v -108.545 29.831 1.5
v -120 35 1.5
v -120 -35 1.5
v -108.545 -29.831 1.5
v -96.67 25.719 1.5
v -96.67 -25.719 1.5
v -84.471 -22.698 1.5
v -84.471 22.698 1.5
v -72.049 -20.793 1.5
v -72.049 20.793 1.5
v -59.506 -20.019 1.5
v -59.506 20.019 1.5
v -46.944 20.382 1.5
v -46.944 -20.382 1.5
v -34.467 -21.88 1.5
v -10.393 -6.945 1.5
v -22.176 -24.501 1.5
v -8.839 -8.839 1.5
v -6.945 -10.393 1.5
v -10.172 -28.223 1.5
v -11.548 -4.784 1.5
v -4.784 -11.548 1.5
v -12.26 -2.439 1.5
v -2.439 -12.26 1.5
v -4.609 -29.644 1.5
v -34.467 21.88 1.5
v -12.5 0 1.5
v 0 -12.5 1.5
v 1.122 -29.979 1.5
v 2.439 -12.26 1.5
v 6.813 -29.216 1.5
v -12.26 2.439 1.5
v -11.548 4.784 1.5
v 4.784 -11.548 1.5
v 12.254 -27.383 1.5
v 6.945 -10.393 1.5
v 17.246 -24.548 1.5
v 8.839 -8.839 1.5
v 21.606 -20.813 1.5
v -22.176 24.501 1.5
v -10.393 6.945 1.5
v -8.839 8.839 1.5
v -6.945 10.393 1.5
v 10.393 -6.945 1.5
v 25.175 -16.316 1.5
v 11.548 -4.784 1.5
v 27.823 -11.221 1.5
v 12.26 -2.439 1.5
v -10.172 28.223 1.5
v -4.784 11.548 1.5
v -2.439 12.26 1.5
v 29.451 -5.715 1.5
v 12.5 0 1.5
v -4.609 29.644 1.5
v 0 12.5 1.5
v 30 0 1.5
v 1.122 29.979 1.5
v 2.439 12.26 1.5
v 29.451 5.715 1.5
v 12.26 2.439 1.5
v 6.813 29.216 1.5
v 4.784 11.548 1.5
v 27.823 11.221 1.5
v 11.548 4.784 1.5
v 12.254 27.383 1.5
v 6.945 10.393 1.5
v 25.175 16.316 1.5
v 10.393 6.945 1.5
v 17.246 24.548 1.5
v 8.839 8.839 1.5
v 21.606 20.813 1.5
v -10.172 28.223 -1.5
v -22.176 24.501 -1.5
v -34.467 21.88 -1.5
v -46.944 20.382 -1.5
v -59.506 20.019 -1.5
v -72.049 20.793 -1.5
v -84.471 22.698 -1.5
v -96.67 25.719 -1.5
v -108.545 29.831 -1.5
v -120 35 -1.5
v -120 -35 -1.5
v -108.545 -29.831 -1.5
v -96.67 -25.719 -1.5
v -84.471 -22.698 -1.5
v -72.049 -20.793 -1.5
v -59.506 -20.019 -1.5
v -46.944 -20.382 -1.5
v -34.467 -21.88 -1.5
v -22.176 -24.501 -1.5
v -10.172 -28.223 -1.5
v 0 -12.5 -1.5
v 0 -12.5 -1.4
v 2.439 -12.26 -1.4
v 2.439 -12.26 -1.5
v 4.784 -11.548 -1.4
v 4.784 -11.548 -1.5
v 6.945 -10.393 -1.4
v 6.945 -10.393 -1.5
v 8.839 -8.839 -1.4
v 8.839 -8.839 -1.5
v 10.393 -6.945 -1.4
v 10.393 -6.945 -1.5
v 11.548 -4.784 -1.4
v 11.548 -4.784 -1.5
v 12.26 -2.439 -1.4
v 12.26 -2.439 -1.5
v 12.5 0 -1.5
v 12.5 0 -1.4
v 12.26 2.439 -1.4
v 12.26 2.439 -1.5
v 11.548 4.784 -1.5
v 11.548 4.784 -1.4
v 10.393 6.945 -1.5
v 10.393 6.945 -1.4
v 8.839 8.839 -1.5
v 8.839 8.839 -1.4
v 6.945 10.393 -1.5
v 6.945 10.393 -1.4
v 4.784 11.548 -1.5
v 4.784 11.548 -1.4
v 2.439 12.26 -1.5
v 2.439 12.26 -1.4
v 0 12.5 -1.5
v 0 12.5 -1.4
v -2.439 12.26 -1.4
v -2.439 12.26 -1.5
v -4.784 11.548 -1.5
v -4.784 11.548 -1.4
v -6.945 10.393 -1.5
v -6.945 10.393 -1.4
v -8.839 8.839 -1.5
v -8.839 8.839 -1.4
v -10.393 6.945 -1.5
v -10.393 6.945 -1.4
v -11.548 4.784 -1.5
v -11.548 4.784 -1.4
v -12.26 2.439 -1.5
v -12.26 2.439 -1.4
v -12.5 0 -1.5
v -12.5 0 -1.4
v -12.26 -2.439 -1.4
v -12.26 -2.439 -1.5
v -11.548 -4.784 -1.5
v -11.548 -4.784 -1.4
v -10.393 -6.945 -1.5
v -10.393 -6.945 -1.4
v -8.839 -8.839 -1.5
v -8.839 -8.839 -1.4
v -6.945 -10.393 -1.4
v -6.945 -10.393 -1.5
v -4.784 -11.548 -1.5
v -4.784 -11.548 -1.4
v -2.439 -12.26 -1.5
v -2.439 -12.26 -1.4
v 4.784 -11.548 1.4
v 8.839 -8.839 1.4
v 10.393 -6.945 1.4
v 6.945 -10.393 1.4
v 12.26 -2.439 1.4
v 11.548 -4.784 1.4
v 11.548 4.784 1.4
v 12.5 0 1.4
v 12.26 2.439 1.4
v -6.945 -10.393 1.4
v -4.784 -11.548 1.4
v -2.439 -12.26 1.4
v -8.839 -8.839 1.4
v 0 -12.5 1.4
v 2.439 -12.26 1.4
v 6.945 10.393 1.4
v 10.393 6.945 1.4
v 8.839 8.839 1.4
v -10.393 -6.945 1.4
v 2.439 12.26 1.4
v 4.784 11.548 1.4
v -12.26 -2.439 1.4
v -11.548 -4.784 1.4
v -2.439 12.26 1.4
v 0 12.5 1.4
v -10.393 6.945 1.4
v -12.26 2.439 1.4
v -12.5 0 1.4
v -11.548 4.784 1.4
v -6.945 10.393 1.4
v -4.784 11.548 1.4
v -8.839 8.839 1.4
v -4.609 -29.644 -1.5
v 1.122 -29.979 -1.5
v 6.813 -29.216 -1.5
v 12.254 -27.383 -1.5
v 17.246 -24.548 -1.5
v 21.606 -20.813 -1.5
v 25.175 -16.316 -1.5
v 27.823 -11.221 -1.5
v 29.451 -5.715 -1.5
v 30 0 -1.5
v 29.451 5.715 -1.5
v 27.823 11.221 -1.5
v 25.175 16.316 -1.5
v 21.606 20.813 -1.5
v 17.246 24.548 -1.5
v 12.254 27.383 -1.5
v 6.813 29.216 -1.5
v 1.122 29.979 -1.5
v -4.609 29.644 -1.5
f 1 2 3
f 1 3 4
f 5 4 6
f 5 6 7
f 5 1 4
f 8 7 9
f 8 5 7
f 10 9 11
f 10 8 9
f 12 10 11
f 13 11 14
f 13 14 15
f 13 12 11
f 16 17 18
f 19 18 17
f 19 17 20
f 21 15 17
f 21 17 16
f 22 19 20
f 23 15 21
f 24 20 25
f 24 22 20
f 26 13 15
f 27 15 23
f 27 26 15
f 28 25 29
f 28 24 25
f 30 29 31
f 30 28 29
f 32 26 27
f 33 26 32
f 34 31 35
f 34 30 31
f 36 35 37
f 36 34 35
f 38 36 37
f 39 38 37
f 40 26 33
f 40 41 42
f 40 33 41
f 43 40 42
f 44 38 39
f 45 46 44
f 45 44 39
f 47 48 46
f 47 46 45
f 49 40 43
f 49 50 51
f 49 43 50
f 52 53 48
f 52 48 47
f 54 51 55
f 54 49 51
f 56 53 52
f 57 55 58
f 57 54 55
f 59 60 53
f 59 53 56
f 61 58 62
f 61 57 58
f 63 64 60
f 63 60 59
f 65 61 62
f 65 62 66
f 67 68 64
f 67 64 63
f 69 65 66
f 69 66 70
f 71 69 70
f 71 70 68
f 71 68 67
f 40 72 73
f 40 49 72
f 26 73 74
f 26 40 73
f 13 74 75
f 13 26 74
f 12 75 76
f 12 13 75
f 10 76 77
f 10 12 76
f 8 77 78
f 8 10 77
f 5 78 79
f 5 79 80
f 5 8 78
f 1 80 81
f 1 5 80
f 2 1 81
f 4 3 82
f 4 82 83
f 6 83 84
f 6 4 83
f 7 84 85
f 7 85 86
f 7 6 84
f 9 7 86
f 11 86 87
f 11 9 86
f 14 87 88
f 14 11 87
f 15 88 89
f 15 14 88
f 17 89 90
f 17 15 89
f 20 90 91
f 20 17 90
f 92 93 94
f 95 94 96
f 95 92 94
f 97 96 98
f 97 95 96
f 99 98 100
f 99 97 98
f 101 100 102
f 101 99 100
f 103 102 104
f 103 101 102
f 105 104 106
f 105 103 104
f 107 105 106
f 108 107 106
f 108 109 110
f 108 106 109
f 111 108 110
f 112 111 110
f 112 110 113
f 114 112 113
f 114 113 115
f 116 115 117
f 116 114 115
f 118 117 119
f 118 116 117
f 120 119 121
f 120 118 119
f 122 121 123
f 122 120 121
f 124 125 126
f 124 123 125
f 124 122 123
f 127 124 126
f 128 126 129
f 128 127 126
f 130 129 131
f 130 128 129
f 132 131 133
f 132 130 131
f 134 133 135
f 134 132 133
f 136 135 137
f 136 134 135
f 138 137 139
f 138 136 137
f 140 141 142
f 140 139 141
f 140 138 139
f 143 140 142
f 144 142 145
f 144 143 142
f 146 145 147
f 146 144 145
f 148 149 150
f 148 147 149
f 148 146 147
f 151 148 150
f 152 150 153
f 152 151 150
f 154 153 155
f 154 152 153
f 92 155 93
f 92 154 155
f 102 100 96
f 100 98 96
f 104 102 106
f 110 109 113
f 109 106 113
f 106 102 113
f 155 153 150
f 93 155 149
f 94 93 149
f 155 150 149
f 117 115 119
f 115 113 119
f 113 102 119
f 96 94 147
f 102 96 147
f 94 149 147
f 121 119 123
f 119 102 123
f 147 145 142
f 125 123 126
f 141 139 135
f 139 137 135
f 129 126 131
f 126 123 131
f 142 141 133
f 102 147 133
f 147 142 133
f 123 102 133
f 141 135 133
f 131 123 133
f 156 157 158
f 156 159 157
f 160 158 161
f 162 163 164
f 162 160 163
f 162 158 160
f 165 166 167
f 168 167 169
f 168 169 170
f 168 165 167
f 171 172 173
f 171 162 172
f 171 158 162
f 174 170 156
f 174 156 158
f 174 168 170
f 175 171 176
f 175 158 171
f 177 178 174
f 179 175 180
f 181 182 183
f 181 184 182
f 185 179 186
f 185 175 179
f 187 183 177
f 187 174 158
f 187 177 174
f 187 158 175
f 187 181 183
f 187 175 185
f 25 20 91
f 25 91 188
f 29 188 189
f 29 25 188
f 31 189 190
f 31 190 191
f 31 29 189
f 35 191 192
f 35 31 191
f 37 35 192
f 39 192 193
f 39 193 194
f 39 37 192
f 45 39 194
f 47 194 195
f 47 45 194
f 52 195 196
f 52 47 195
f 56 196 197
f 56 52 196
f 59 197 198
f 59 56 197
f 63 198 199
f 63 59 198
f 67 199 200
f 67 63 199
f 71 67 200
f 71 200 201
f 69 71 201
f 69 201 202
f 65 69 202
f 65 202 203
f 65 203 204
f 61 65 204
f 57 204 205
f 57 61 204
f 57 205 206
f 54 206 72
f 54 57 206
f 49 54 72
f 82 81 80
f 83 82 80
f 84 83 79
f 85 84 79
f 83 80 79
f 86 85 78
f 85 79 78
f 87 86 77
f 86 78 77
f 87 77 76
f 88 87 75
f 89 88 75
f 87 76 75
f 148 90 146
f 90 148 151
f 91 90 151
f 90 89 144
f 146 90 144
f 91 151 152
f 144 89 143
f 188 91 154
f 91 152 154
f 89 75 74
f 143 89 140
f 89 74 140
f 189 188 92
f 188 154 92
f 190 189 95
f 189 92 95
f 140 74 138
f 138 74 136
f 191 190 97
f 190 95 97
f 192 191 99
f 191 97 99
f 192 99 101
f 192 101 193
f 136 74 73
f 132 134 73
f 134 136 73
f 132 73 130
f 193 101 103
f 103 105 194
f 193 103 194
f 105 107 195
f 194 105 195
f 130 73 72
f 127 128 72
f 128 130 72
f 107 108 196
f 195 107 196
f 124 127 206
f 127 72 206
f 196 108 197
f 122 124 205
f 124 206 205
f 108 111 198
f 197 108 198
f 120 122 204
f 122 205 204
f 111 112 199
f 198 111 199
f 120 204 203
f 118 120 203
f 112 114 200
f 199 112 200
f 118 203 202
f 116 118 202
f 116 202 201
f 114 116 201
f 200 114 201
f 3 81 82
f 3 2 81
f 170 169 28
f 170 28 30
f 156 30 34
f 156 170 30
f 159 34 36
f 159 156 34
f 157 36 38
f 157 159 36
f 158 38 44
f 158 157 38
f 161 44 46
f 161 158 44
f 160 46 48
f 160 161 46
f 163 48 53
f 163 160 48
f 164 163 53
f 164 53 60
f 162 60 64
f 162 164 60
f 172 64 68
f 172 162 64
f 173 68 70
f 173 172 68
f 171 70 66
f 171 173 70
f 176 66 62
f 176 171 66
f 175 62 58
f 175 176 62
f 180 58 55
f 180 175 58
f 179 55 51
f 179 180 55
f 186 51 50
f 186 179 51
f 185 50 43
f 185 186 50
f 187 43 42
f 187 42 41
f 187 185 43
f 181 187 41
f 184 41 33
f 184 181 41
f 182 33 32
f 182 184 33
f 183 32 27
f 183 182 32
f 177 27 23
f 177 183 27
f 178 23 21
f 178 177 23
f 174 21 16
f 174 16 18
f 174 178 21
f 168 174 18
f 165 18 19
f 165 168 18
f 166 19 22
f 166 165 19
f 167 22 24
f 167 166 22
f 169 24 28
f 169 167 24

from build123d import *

# Parameters (mm, degrees)
SKETCH1_R                = 12.5
BOSS_EXTRUDE1_DEPTH      = 1.5
BOSS_EXTRUDE2_DEPTH      = 1.4
BOSS_EXTRUDE2_DEPTH_BACK = 1.4
SKETCH1_3_R              = 12.5
BODY_MOVE_COPY1_ANGLE    = 90


with BuildPart() as part:
    # Sketch1 → Boss-Extrude1 (new, symmetric)
    with BuildSketch(Plane(origin=(0, 0, 0), x_dir=(1, 0, 0), z_dir=(0, 1, 0))):
        with BuildLine():
            Line((-120, 35), (-120, -35))
            ThreePointArc((-120, -35), (-65.786340219, -20.263519795), (-10.172182489, -28.222804669))
            ThreePointArc((-10.172182489, -28.222804669), (30, 0), (-10.172182489, 28.222804669))
            ThreePointArc((-10.172182489, 28.222804669), (-65.786340219, 20.263519795), (-120, 35))
        make_face()
        with Locations(Location((0, 0, 0), (0, 0, 270))):
            Circle(SKETCH1_R, mode=Mode.SUBTRACT)
    extrude(amount=BOSS_EXTRUDE1_DEPTH, both=True)

    # Sketch1<3> → Boss-Extrude2 (add, two sides: drawn at the far end of the back side and taken through both)
    with BuildSketch(Plane(origin=(0, 0, 0), x_dir=(1, 0, 0), z_dir=(0, 1, 0)).offset(-BOSS_EXTRUDE2_DEPTH_BACK)):
        with Locations(Location((0, 0, 0), (0, 0, 90))):
            Circle(SKETCH1_3_R)
    extrude(amount=BOSS_EXTRUDE2_DEPTH + BOSS_EXTRUDE2_DEPTH_BACK)


with BuildPart() as part_1:
    # Body-Move/Copy1: moved
    add(part.part.rotate(Axis((0, 0, 0), (1, 0, 0)), BODY_MOVE_COPY1_ANGLE))


solid = part_1.part
